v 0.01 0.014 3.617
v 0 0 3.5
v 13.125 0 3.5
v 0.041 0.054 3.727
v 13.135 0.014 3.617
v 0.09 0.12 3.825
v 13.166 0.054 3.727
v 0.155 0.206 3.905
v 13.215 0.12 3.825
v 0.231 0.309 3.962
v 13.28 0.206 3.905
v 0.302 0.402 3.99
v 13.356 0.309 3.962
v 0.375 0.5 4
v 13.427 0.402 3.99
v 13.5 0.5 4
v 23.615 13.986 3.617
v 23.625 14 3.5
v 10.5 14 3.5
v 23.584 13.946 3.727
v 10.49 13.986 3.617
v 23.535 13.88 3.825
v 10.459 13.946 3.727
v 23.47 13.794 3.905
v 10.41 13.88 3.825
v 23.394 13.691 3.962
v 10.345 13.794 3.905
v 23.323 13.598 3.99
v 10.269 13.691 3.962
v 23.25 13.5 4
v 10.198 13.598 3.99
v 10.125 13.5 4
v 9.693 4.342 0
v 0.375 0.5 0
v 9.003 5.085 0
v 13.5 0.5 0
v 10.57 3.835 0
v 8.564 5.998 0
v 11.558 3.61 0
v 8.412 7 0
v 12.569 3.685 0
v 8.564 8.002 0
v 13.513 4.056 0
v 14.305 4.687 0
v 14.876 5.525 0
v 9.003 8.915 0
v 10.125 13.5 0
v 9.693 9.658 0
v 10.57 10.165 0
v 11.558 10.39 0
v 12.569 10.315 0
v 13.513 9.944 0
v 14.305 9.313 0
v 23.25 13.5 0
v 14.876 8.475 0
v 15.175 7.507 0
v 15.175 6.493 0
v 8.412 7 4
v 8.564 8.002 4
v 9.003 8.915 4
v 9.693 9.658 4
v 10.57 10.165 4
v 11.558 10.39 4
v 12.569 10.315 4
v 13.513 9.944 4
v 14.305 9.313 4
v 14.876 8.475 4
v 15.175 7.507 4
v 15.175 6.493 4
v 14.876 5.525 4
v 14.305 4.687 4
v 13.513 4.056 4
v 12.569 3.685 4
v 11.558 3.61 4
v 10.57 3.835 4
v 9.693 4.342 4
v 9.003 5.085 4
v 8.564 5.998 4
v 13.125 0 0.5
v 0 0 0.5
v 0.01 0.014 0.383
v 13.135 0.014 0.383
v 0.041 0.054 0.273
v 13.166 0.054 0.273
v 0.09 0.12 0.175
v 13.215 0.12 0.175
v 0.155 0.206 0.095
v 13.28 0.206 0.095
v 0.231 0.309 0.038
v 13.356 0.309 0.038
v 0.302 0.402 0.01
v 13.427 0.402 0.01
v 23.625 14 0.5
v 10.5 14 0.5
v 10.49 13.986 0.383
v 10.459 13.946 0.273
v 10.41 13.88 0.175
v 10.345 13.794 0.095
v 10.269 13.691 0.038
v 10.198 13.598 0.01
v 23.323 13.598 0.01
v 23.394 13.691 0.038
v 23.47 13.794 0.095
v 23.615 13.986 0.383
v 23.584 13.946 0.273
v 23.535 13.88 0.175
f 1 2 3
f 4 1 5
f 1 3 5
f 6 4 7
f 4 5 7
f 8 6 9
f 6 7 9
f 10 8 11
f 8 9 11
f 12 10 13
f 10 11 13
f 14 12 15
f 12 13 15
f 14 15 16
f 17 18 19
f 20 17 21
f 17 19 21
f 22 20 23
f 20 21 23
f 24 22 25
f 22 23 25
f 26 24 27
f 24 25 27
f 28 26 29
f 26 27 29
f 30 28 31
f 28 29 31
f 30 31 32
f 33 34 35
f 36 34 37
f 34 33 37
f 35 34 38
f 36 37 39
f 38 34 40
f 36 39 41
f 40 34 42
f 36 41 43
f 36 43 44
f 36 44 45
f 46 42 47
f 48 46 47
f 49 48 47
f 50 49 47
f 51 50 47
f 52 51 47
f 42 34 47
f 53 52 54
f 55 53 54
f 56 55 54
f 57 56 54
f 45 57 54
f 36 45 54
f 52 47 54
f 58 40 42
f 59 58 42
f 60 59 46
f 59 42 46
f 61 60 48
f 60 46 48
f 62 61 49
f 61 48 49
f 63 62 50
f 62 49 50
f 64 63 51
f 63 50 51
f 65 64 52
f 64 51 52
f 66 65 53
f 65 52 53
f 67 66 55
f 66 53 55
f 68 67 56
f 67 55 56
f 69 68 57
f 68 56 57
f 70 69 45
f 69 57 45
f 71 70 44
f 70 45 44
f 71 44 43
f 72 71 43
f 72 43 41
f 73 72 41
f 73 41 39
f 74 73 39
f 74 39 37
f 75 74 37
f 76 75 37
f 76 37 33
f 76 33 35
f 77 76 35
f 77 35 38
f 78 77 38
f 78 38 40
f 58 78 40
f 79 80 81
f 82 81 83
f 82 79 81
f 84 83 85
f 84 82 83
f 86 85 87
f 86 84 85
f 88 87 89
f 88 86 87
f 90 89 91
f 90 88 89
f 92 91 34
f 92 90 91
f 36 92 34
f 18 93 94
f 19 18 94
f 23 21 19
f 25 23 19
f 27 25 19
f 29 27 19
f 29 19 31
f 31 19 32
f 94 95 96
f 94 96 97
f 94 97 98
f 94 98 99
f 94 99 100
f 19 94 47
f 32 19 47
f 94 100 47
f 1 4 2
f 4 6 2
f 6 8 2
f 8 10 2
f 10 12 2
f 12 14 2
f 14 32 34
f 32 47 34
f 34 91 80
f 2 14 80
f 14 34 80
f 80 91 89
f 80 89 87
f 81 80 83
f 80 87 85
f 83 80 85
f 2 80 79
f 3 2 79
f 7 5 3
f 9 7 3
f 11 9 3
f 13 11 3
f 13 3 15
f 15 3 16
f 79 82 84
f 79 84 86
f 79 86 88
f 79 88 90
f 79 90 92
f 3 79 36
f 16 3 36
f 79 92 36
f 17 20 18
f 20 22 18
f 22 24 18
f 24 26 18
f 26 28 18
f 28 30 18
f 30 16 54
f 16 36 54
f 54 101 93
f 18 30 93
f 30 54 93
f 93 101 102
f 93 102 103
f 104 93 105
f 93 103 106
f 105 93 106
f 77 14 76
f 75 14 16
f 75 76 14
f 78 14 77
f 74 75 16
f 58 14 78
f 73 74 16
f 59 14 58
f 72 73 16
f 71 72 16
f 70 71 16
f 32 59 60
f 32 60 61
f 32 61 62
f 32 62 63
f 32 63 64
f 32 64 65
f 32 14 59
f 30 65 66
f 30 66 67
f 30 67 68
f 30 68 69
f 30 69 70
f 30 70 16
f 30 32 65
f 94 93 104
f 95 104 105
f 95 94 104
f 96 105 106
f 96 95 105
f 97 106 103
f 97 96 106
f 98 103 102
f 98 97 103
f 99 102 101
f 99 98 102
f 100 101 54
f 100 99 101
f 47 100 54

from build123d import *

# Parameters (mm, degrees)
EXTRUDE_1_DEPTH        = 4
HOLE_WIZARD_M8_1_D     = 6.8
HOLE_WIZARD_M8_1_DEPTH = 19.75
HOLE_WIZARD_M8_1_TIP   = 2.042926105
FILLET_1_R             = 0.5


with BuildPart() as part:
    # 草图1 → 凸台-拉伸1 (new body)
    with BuildSketch(Plane.XY):
        Polygon((10.5, 14), (0, 0), (13.125, 0), (23.625, 14), align=None)
    extrude(amount=EXTRUDE_1_DEPTH)

    # M8 螺纹孔1
    with Locations(Plane(origin=(11.8125, 7, 4), x_dir=(1, 0, 0), z_dir=(0, 0, 1))):
        with Locations((0, 0)):
            Hole(HOLE_WIZARD_M8_1_D / 2, depth=HOLE_WIZARD_M8_1_DEPTH)
            with Locations((0, 0, -(HOLE_WIZARD_M8_1_DEPTH + HOLE_WIZARD_M8_1_TIP / 2))):  # 118° drill point
                Cone(0, HOLE_WIZARD_M8_1_D / 2, HOLE_WIZARD_M8_1_TIP, mode=Mode.SUBTRACT)

    # 圆角1
    fillet_1_edges = [part.edges().sort_by_distance(p)[0] for p in [
        (6.5625, 0, 4),
        (17.0625, 14, 4),
        (6.5625, 0, 0),
        (17.0625, 14, 0),
    ]]
    fillet(fillet_1_edges, radius=FILLET_1_R)


solid = part.part
